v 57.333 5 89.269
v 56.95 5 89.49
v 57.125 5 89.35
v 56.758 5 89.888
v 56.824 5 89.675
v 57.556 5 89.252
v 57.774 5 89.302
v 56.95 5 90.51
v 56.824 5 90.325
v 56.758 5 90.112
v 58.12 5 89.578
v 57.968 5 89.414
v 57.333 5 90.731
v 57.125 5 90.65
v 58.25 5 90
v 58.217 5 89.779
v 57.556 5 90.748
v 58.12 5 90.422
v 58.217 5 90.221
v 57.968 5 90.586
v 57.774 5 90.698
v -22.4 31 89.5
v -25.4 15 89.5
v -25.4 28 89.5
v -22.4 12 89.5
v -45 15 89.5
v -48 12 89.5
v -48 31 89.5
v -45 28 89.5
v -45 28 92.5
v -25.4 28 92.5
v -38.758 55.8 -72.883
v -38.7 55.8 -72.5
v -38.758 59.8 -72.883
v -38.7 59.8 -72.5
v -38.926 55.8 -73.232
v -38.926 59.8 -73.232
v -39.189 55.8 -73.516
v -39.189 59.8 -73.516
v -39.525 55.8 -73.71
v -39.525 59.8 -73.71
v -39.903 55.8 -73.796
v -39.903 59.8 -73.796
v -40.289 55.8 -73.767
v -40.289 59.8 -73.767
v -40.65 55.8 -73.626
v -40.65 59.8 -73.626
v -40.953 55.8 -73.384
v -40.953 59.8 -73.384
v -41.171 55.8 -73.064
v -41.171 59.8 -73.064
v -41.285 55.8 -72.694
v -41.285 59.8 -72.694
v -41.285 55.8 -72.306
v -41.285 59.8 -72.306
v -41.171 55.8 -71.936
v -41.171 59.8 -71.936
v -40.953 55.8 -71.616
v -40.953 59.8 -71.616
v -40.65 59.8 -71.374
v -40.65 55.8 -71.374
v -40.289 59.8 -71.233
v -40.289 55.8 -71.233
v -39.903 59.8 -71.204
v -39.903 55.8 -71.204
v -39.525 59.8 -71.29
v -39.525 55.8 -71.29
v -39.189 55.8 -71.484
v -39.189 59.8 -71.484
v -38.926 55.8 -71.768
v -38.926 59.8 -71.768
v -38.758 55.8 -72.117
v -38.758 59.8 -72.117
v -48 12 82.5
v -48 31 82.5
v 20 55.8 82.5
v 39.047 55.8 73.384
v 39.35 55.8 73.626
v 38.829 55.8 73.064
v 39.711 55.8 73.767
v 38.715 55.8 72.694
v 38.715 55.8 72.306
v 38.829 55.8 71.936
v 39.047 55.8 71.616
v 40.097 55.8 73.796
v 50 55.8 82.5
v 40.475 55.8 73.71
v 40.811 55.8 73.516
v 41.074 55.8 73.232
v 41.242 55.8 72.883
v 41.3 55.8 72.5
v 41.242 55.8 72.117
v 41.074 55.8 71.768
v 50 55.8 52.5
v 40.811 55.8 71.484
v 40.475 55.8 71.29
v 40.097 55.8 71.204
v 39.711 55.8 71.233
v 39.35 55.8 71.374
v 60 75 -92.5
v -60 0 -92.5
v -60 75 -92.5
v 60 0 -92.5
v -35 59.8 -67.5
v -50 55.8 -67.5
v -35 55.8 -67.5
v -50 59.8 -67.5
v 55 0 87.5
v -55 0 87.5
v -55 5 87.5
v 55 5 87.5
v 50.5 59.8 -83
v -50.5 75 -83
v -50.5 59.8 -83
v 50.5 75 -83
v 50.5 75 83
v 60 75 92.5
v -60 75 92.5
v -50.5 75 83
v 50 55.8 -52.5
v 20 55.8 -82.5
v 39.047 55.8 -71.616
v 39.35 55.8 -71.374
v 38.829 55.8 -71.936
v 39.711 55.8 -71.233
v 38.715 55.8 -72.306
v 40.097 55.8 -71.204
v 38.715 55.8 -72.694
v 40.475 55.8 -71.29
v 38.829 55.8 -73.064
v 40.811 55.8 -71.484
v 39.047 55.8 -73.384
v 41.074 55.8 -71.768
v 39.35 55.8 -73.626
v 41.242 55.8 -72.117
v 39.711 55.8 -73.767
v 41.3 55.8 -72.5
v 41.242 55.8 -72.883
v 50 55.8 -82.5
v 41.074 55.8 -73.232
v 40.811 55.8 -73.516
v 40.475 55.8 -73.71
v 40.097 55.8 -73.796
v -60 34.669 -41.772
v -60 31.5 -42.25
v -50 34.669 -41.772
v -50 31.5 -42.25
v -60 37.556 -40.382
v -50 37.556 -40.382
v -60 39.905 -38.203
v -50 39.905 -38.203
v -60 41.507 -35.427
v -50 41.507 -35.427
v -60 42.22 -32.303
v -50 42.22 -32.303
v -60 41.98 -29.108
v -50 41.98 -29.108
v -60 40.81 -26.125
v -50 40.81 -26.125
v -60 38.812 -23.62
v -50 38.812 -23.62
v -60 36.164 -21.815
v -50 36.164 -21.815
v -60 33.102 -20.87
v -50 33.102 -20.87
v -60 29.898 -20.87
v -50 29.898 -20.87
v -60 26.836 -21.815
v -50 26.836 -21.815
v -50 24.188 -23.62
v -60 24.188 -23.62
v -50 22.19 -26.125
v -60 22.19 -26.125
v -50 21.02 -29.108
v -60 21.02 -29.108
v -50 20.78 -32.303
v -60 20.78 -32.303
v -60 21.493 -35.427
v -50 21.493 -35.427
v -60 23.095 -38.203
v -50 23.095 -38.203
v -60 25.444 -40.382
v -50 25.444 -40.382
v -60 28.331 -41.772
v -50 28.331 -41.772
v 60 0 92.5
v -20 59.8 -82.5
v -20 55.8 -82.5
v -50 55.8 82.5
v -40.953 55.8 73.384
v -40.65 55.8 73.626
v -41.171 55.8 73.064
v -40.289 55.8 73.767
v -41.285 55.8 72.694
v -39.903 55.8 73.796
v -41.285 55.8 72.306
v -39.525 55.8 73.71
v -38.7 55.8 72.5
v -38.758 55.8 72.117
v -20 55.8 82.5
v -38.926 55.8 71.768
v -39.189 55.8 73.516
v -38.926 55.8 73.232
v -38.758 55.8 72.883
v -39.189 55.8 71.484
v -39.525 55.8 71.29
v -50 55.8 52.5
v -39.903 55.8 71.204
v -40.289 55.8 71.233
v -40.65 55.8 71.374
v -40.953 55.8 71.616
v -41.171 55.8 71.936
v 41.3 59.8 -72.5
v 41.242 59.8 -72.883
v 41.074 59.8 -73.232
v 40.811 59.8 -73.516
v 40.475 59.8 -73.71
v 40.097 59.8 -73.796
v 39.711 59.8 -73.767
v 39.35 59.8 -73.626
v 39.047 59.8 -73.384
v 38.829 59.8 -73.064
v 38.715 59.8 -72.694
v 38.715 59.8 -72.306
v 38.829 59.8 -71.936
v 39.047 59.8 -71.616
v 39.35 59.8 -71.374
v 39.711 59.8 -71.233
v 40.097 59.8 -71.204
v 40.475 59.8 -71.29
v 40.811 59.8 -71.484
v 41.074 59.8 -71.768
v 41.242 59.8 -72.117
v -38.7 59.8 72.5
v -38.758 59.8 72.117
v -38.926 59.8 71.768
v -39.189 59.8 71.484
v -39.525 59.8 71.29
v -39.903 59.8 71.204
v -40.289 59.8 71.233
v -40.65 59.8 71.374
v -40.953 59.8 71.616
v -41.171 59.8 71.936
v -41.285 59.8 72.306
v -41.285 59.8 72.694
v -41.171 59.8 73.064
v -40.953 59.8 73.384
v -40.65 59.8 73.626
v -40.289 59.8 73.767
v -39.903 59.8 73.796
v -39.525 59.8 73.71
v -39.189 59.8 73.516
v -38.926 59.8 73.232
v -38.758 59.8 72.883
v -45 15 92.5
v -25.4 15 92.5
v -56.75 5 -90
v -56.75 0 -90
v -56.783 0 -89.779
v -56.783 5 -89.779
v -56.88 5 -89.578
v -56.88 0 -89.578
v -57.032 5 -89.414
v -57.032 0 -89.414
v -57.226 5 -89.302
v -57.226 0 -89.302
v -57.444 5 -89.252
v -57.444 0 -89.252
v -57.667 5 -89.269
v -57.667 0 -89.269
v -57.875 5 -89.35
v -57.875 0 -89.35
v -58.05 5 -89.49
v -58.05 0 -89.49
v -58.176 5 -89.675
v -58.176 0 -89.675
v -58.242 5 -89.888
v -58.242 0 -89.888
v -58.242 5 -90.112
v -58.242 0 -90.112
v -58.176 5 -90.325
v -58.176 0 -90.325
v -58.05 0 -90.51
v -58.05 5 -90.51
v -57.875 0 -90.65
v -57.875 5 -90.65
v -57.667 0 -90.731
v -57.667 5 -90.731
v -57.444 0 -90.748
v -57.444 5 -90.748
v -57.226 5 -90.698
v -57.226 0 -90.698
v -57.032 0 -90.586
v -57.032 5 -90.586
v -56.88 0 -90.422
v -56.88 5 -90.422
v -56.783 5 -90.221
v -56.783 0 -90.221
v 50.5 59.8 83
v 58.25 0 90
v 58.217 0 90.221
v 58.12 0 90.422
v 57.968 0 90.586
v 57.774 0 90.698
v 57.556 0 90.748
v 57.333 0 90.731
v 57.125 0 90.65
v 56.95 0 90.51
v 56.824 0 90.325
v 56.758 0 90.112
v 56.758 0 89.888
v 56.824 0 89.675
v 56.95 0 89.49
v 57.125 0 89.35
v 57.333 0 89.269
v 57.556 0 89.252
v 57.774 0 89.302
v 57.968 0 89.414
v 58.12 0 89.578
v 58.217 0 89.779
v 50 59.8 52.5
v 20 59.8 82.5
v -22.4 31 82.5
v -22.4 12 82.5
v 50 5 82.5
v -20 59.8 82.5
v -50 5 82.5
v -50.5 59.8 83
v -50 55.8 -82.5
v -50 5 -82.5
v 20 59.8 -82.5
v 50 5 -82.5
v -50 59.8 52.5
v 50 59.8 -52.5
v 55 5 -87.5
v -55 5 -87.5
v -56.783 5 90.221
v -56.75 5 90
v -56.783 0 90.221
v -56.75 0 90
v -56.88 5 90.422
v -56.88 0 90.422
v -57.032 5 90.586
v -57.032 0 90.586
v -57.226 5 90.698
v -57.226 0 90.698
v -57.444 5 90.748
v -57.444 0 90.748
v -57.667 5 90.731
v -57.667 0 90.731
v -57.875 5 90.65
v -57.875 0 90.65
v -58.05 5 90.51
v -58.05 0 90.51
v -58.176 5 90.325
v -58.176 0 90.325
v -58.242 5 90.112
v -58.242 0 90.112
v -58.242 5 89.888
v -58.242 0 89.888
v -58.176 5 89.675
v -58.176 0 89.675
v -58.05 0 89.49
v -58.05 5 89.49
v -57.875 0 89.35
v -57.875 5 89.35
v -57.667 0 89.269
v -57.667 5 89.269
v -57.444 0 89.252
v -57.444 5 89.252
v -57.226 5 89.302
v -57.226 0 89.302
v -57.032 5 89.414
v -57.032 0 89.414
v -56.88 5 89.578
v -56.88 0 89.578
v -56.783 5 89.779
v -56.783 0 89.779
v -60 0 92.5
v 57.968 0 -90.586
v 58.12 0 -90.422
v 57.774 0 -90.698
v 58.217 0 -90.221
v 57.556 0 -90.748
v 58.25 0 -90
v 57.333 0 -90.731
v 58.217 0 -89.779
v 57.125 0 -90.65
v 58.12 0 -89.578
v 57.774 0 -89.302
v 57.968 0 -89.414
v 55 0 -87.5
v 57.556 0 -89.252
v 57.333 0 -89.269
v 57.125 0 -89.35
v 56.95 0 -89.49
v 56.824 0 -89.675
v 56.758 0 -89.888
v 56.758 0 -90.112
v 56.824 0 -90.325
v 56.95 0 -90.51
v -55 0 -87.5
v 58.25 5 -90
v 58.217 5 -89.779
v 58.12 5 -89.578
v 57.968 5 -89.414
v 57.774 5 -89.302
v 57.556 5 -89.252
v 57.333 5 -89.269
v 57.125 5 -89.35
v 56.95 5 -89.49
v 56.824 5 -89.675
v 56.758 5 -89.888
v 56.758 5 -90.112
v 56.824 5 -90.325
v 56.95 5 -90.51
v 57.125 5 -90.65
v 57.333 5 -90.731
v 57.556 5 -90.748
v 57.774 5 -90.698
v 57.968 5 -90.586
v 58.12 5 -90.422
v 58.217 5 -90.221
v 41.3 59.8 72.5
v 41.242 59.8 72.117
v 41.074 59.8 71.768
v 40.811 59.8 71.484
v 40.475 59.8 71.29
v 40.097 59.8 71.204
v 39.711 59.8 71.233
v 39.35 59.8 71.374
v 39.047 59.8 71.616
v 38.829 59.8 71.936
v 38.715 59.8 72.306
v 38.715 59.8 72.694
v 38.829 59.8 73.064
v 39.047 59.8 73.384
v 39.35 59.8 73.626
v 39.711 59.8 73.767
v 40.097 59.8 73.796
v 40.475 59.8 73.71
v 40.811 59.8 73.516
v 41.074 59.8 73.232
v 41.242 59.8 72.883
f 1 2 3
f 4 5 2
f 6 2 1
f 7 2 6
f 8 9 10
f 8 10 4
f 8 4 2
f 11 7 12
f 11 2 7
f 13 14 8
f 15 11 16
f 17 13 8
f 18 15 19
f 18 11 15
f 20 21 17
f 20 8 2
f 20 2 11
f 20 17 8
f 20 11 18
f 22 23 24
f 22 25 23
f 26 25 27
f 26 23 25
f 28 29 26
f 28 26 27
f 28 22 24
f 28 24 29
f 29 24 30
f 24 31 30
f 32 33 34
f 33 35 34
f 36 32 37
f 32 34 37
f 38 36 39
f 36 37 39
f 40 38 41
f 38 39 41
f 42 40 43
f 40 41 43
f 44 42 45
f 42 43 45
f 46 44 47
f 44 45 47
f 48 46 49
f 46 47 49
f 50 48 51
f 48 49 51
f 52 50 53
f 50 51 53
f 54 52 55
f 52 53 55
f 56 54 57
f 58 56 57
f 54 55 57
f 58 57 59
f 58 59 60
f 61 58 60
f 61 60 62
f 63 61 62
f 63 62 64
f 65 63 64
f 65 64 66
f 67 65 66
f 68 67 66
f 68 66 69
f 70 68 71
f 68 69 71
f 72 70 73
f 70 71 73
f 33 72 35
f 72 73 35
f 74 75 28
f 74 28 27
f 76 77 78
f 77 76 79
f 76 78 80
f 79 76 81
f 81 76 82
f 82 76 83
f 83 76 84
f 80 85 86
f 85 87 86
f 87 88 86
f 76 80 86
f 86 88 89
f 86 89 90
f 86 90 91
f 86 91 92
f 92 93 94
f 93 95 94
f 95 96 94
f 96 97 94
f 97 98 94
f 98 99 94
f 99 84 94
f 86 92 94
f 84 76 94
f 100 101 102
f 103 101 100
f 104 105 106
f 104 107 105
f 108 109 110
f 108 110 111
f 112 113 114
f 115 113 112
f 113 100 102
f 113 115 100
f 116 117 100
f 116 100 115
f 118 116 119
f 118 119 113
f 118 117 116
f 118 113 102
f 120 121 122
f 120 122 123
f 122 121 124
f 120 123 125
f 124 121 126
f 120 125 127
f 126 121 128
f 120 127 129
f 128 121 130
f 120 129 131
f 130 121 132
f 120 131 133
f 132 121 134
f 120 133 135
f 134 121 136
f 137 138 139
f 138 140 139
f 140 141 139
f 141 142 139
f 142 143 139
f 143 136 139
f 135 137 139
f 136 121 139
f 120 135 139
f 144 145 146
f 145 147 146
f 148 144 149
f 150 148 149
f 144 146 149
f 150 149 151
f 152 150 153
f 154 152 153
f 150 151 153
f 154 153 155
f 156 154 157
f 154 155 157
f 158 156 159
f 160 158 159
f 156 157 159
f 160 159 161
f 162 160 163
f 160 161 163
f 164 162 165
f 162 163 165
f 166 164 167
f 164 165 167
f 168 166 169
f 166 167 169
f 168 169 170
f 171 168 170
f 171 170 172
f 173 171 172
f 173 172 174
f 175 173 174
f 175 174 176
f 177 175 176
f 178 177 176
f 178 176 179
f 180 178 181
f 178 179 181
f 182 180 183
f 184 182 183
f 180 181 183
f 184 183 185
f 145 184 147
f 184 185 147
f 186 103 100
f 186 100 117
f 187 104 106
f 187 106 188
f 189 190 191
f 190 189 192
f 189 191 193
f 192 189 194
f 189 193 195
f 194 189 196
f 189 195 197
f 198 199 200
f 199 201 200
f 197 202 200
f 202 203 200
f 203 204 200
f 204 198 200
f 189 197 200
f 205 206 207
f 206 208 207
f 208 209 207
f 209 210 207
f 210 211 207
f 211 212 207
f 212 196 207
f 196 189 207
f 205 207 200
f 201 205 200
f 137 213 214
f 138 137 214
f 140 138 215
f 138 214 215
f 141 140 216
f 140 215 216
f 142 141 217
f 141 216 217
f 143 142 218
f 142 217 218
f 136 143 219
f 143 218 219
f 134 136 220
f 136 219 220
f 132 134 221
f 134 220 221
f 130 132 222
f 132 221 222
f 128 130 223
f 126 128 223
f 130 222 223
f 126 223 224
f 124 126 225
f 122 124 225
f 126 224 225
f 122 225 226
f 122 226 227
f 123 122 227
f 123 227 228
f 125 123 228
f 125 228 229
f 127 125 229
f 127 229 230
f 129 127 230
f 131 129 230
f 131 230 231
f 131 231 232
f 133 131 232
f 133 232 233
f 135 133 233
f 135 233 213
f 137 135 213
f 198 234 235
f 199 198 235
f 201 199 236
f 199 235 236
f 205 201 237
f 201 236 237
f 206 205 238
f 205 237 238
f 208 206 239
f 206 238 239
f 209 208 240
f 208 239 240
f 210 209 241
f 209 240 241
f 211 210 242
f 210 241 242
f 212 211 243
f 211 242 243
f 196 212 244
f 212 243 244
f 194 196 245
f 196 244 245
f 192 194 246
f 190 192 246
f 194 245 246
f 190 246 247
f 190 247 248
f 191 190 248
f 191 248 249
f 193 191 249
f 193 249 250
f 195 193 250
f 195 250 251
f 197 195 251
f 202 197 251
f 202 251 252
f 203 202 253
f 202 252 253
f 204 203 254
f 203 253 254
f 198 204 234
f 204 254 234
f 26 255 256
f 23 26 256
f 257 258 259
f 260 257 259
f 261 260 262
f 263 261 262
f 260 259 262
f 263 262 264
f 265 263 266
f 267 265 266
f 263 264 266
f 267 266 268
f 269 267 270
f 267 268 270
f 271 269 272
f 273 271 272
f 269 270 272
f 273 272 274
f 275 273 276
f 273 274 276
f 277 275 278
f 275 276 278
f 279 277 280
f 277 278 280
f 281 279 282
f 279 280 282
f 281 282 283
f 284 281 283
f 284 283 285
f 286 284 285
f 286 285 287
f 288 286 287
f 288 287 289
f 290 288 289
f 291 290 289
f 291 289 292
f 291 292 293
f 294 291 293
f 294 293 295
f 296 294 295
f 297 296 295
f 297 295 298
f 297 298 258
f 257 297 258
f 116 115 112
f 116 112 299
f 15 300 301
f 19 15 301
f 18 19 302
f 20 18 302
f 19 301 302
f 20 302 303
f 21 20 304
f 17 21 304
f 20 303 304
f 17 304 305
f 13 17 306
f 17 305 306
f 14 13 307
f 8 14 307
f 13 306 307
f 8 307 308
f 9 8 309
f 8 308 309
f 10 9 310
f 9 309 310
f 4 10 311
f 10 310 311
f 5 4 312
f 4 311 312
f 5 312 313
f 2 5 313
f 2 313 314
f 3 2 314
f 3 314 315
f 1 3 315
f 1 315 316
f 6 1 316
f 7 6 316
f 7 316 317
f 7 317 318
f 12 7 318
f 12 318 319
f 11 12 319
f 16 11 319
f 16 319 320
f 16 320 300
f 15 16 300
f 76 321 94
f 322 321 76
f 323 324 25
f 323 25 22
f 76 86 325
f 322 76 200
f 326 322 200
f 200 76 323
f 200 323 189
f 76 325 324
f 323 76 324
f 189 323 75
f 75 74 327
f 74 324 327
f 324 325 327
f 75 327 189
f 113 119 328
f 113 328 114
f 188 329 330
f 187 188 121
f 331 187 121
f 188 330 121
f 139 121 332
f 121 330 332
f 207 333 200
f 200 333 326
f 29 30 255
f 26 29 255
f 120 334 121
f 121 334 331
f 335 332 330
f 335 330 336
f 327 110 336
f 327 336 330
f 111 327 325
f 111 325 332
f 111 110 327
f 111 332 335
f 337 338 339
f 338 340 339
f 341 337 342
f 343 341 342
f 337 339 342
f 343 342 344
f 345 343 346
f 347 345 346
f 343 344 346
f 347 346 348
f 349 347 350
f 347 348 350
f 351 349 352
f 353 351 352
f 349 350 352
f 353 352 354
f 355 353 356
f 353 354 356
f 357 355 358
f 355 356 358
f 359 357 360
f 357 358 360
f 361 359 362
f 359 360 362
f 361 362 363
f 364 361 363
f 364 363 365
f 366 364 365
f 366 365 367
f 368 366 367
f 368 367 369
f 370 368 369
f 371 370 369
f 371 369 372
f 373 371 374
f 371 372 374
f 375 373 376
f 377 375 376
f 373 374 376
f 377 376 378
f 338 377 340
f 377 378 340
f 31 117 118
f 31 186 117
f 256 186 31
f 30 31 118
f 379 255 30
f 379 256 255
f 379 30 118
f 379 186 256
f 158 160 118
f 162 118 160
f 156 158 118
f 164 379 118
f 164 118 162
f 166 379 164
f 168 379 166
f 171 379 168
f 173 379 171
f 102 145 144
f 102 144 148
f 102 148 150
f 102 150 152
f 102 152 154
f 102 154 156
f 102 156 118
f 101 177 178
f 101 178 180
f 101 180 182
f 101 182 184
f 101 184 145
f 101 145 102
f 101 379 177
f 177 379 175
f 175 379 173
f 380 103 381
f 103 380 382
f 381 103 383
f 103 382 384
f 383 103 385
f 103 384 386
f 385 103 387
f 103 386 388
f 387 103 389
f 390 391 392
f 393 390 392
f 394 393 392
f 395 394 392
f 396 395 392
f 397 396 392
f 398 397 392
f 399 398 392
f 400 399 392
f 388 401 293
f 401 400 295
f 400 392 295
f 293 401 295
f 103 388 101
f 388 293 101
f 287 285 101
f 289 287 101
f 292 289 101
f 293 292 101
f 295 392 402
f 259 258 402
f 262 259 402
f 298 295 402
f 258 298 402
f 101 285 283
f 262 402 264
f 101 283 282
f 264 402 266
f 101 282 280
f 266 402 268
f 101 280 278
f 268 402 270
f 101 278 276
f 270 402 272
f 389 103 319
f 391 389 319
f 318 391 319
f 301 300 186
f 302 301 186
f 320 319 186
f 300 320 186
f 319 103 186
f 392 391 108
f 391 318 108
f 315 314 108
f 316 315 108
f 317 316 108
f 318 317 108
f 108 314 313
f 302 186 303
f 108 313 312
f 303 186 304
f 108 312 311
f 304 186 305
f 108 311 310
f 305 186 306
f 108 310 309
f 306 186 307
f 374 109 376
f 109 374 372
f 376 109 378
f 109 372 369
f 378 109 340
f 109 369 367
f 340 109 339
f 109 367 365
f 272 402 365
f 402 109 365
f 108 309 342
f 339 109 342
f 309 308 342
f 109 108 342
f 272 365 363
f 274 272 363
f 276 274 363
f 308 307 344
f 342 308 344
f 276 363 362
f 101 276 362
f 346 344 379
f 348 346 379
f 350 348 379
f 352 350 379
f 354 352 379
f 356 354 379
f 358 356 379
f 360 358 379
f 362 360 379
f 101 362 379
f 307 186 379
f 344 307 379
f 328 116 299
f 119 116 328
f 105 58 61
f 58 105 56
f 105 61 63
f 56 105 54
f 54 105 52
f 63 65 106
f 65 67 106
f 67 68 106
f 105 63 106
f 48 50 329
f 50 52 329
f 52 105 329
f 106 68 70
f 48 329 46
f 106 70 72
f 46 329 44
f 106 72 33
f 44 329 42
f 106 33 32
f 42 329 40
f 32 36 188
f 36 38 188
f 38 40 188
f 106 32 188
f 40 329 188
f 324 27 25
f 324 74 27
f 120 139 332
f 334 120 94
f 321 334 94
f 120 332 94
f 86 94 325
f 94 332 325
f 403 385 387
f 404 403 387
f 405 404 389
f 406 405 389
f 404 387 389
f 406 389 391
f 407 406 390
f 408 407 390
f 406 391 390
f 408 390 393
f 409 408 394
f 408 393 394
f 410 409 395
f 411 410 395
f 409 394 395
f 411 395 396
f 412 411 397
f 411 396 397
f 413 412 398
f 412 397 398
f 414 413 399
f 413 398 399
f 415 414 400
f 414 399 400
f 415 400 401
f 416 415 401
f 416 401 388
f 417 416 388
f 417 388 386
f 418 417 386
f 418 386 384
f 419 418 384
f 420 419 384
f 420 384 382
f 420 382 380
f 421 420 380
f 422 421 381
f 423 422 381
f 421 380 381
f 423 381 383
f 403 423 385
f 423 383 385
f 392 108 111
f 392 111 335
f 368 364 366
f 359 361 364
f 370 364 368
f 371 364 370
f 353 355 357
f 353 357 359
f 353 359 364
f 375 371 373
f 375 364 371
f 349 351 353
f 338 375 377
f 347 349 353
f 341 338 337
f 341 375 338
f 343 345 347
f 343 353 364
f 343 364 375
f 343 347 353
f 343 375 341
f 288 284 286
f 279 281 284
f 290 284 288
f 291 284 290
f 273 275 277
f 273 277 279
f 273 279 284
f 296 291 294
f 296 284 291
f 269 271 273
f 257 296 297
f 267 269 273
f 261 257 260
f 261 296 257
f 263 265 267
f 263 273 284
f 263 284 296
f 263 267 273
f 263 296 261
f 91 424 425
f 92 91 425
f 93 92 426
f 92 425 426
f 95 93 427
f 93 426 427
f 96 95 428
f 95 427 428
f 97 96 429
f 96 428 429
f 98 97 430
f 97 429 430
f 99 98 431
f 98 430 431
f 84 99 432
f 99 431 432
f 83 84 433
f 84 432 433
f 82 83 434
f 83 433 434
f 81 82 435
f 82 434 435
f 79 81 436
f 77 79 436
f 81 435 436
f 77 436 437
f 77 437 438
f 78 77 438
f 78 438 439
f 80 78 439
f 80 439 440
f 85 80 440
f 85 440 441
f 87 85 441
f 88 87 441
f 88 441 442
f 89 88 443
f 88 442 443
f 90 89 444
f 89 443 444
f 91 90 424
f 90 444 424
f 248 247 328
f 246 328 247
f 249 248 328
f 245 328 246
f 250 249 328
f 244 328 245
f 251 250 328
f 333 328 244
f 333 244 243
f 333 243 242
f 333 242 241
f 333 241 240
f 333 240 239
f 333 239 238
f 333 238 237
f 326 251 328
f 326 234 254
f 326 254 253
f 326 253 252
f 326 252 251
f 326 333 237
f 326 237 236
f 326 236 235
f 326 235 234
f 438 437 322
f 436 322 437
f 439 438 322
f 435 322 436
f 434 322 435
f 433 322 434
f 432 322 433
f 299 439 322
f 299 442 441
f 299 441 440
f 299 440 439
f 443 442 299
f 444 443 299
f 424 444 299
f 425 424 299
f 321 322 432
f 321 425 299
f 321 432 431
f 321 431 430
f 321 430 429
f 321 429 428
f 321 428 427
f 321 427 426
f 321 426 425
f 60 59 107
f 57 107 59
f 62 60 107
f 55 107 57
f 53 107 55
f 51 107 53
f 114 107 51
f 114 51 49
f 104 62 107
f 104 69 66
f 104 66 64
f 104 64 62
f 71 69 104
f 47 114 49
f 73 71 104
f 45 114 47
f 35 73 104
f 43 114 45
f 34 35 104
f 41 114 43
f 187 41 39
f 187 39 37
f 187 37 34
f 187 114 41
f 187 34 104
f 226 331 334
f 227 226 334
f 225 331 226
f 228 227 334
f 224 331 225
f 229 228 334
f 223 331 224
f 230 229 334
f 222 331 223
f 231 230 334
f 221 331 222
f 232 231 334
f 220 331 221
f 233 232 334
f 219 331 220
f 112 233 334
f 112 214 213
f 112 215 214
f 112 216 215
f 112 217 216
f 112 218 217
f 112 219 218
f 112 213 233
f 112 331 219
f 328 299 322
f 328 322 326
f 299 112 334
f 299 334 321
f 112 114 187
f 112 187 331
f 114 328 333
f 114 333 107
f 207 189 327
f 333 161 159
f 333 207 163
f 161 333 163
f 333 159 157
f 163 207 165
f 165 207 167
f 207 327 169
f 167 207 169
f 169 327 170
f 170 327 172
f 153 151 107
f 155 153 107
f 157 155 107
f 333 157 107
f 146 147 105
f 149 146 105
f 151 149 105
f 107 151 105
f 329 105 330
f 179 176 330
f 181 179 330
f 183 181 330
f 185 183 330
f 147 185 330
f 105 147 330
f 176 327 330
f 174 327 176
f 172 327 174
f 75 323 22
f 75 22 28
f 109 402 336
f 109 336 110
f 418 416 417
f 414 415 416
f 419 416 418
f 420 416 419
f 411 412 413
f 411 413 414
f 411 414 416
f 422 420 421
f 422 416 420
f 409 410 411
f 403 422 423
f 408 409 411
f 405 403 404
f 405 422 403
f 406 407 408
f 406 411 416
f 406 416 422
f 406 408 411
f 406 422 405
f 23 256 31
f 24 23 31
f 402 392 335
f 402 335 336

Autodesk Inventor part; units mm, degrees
ref_plane "YZ Plane" through (0, 0, 0) normal (1, 0, 0) x (0, 1, 0)
ref_plane "XZ Plane" through (0, 0, 0) normal (0, 1, 0) x (-1, 0, 0)
sketch "Sketch1" plane through (0, 0, 0) normal (0, 1, 0) x (-1, 0, 0)
  line L0 (-50, 82.5) -> (50, 82.5)
  line L1 (50, 82.5) -> (50, -82.5)
  line L2 (50, -82.5) -> (-50, -82.5)
  line L3 (-50, -82.5) -> (-50, 82.5)
  line L4 (-50, 82.5) -> (50, -82.5) construction
  line L5 (50, 82.5) -> (-50, -82.5) construction
  line L6 (-60, 92.5) -> (60, 92.5)
  line L7 (60, 92.5) -> (60, -92.5)
  line L8 (60, -92.5) -> (-60, -92.5)
  line L9 (-60, -92.5) -> (-60, 92.5)
  line L10 (-60, 92.5) -> (60, -92.5) construction
  line L11 (60, 92.5) -> (-60, -92.5) construction
  point P0 (0, 0)
  dimension "d0" = 100
  dimension "d1" = 165
  dimension "d2" = 120
  dimension "d3" = 185
extrude "Extrusion1" add sketch "Sketch1" along normal blind 75
ref_plane "Work Plane2" through (0, 59.8, 0) normal (0, 1, 0) x (1, 0, 0)
sketch "Sketch3" plane through (0, 59.8, 0) normal (0, 1, 0) x (1, 0, 0)
  line L0 (50, 82.5) -> (50, -82.5) projected
  line L1 (50, 82.5) -> (20, 82.5)
  line L2 (-50, 82.5) -> (50, 82.5) projected
  line L3 (50, 82.5) -> (50, 52.5)
  line L4 (50, 52.5) -> (20, 82.5)
  line L5 (50, -82.5) -> (50, -52.5)
  line L6 (50, -52.5) -> (20, -82.5)
  line L7 (50, -82.5) -> (-50, -82.5) projected
  line L8 (20, -82.5) -> (50, -82.5)
  line L9 (0, 82.5) -> (0, -82.5)
  line L10 (-50, 82.5) -> (-50, -82.5)
  line L11 (-50, 82.5) -> (-20, 82.5)
  line L12 (-50, 52.5) -> (-20, 82.5)
  line L13 (-50, -52.5) -> (-20, -82.5)
  line L14 (-50, -82.5) -> (50, -82.5)
  point P0 (0, 0)
  point P1 (-20, 82.5)
  dimension "d9" = 30
  dimension "d10" = 30
  dimension "d20" = 30
  dimension "d50" = 30
extrude "Extrusion3" add sketch "Sketch3" against normal blind 4 contours L0 L4 L1 | L0 L7 L6 | L12 L10 L2 | L7 L10 L13
sketch "Sketch5" plane through (0, 59.8, 0) normal (0, 1, 0) x (1, 0, 0)
  circle A0 centre (40, 72.5) radius 1.3
  line L0 (50, 82.5) -> (50, -82.5) projected
  line L1 (50, 0) -> (-50, 0)
  line L2 (-50, -82.5) -> (-50, 82.5) projected
  line L3 (50, -82.5) -> (-50, -82.5) projected
  line L4 (0, -82.5) -> (0, 82.5)
  line L5 (-50, 82.5) -> (50, 82.5) projected
  line L6 (50, -82.5) -> (20, -82.5) projected
  line L7 (50, -82.5) -> (40, -82.5)
  line L8 (40, -82.5) -> (40, -72.5)
  line L9 (40, -72.5) -> (50, -72.5)
  line L10 (50, -72.5) -> (50, -82.5)
  circle A1 centre (40, -72.5) radius 1.3
  line L11 (-50, 52.5) -> (-50, 82.5) projected
  line L12 (-50, 82.5) -> (-40, 82.5)
  line L13 (-40, 82.5) -> (-40, 72.5)
  line L14 (-40, 72.5) -> (-50, 72.5)
  line L15 (-50, 72.5) -> (-50, 82.5)
  circle A2 centre (-40, 72.5) radius 1.3
  line L16 (-50, -82.5) -> (-40, -82.5)
  line L17 (-40, -82.5) -> (-40, -72.5)
  line L18 (-40, -72.5) -> (-50, -72.5)
  line L19 (-50, -72.5) -> (-50, -82.5)
  circle A3 centre (-40, -72.5) radius 1.3
  dimension "d17" = 2.6
  dimension "d21" = 10
  dimension "d22" = 10
  dimension "d23" = 2.6
  dimension "d24" = 10
  dimension "d25" = 10
  dimension "d26" = 2.6
  dimension "d27" = 10
  dimension "d28" = 10
  dimension "d29" = 2.6
  dimension "d48" = 10
  dimension "d49" = 10
extrude "Extrusion5" cut sketch "Sketch5" against normal blind 4 contours A0 | A1 L8 L9 | L9 L8 A1 | A2 L14 L13 | L13 L14 A2 | A3 L17 L18 | L18 L17 A3
sketch "Sketch10" plane through (0, 0, 0) normal (0, -1, 0) x (1, 0, 0)
  line L0 (55, -87.5) -> (-55, -87.5)
  line L1 (-55, -87.5) -> (-55, 87.5)
  line L2 (-55, 87.5) -> (55, 87.5)
  line L3 (55, 87.5) -> (55, -87.5)
  line L4 (55, -87.5) -> (-55, 87.5) construction
  line L5 (-55, -87.5) -> (55, 87.5) construction
  point P0 (0, 0)
  dimension "d38" = 110
  dimension "d39" = 175
extrude "Extrusion8" cut sketch "Sketch10" against normal blind 5
sketch "Sketch11" plane through (0, 0, 0) normal (0, -1, 0) x (1, 0, 0)
  line L0 (-55, -87.5) -> (-55, 87.5) projected
  line L1 (-60, -92.5) -> (-60, 92.5) projected
  circle A0 centre (-57.5, -90) radius 0.75
  line L2 (-60, -92.5) -> (-60, 92.5) projected
  circle A1 centre (-57.5, 90) radius 0.75
  line L3 (-60, 92.5) -> (60, 92.5) projected
  line L4 (55, 87.5) -> (55, -87.5) projected
  circle A2 centre (57.5, 90) radius 0.75
  line L5 (60, -92.5) -> (-60, -92.5) projected
  circle A3 centre (57.5, -90) radius 0.75
  point P0 (0, 0)
  dimension "d42" = 1.5
  dimension "d43" = 1.5
  dimension "d44" = 1.5
  dimension "d45" = 1.5
extrude "Extrusion9" cut sketch "Sketch11" against normal blind 5
sketch "Sketch12" plane through (0, 75, 0) normal (0, 1, 0) x (1, 0, 0)
  line L0 (-50.5, 83) -> (50.5, 83)
  line L1 (50.5, 83) -> (50.5, -83)
  line L2 (50.5, -83) -> (-50.5, -83)
  line L3 (-50.5, -83) -> (-50.5, 83)
  line L4 (-50.5, 83) -> (50.5, -83) construction
  line L5 (50.5, 83) -> (-50.5, -83) construction
  point P0 (0, 0)
  dimension "d51" = 101
  dimension "d52" = 166
extrude "Extrusion10" cut sketch "Sketch12" against normal blind 15.2
sketch "Sketch15" plane through (0, 59.8, 0) normal (0, 1, 0) x (1, 0, 0)
  line L0 (-20, 82.5) -> (-50, 52.5) projected
  line L1 (-50, 52.5) -> (-50, 67.5)
  line L2 (-50, 67.5) -> (-35, 67.5)
  line L3 (-35, 67.5) -> (-35, 52.5)
  line L4 (-35, 52.5) -> (-50, 52.5)
  line L5 (-50, 52.5) -> (-50, 67.5)
  point P0 (0, 0)
  dimension "d56" = 15
  dimension "d57" = 15
  dimension "d58" = 15
extrude "Extrusion11" cut sketch "Sketch15" against normal blind 4
sketch "Sketch16" plane through (-60, 0, 92.5) normal (0, 0, 1) x (1, 0, 0)
  line L0 (0, 0) -> (0, 75) projected
  line L1 (0, 0) -> (0, 15)
  line L2 (0, 15) -> (15, 15)
  line L3 (15, 15) -> (34.6, 15)
  line L4 (34.6, 15) -> (34.6, 28)
  line L5 (34.6, 28) -> (15, 28)
  line L6 (15, 28) -> (15, 15)
  point P0 (60, 0)
  dimension "d61" = 15
  dimension "d62" = 15
  dimension "d63" = 19.6
  dimension "d64" = 13
extrude "Extrusion12" cut sketch "Sketch16" against normal blind 10
sketch "Sketch18" plane through (20, 59.8, 82.5) normal (0, 0, -1) x (-1, 0, 0)
  line L0 (45.4, -44.8) -> (45.4, -31.8) projected
  line L1 (45.4, -31.8) -> (45.4, -28.8)
  line L2 (45.4, -28.8) -> (42.4, -28.8)
  line L3 (65, -31.8) -> (65, -44.8) projected
  line L4 (65, -44.8) -> (68, -44.8)
  line L5 (68, -44.8) -> (68, -47.8)
  line L6 (42.4, -28.8) -> (68, -28.8)
  line L7 (68, -28.8) -> (68, -47.8)
  line L8 (68, -47.8) -> (42.4, -47.8)
  line L9 (42.4, -47.8) -> (42.4, -28.8)
  point P0 (20, -59.8)
  dimension "d67" = 3
  dimension "d68" = 3
  dimension "d69" = 3
  dimension "d70" = 3
extrude "Extrusion13" cut sketch "Sketch18" against normal blind 7
sketch "Sketch19" plane through (-50, 55.8, 82.5) normal (1, 0, 0) x (0, 0, -1)
  line L0 (0, -50.8) -> (165, -50.8) projected
  circle A0 centre (114, -24.3) radius 10.75
  point P0 (82.5, -55.8)
  point P1 (114, -50.8)
  dimension "d73" = 51
  dimension "d74" = 26.5
  dimension "d75" = 21.5
extrude "Extrusion14" cut sketch "Sketch19" against normal blind 10
properties part number "Enclose Top" material "PC/ABS Plastic"
